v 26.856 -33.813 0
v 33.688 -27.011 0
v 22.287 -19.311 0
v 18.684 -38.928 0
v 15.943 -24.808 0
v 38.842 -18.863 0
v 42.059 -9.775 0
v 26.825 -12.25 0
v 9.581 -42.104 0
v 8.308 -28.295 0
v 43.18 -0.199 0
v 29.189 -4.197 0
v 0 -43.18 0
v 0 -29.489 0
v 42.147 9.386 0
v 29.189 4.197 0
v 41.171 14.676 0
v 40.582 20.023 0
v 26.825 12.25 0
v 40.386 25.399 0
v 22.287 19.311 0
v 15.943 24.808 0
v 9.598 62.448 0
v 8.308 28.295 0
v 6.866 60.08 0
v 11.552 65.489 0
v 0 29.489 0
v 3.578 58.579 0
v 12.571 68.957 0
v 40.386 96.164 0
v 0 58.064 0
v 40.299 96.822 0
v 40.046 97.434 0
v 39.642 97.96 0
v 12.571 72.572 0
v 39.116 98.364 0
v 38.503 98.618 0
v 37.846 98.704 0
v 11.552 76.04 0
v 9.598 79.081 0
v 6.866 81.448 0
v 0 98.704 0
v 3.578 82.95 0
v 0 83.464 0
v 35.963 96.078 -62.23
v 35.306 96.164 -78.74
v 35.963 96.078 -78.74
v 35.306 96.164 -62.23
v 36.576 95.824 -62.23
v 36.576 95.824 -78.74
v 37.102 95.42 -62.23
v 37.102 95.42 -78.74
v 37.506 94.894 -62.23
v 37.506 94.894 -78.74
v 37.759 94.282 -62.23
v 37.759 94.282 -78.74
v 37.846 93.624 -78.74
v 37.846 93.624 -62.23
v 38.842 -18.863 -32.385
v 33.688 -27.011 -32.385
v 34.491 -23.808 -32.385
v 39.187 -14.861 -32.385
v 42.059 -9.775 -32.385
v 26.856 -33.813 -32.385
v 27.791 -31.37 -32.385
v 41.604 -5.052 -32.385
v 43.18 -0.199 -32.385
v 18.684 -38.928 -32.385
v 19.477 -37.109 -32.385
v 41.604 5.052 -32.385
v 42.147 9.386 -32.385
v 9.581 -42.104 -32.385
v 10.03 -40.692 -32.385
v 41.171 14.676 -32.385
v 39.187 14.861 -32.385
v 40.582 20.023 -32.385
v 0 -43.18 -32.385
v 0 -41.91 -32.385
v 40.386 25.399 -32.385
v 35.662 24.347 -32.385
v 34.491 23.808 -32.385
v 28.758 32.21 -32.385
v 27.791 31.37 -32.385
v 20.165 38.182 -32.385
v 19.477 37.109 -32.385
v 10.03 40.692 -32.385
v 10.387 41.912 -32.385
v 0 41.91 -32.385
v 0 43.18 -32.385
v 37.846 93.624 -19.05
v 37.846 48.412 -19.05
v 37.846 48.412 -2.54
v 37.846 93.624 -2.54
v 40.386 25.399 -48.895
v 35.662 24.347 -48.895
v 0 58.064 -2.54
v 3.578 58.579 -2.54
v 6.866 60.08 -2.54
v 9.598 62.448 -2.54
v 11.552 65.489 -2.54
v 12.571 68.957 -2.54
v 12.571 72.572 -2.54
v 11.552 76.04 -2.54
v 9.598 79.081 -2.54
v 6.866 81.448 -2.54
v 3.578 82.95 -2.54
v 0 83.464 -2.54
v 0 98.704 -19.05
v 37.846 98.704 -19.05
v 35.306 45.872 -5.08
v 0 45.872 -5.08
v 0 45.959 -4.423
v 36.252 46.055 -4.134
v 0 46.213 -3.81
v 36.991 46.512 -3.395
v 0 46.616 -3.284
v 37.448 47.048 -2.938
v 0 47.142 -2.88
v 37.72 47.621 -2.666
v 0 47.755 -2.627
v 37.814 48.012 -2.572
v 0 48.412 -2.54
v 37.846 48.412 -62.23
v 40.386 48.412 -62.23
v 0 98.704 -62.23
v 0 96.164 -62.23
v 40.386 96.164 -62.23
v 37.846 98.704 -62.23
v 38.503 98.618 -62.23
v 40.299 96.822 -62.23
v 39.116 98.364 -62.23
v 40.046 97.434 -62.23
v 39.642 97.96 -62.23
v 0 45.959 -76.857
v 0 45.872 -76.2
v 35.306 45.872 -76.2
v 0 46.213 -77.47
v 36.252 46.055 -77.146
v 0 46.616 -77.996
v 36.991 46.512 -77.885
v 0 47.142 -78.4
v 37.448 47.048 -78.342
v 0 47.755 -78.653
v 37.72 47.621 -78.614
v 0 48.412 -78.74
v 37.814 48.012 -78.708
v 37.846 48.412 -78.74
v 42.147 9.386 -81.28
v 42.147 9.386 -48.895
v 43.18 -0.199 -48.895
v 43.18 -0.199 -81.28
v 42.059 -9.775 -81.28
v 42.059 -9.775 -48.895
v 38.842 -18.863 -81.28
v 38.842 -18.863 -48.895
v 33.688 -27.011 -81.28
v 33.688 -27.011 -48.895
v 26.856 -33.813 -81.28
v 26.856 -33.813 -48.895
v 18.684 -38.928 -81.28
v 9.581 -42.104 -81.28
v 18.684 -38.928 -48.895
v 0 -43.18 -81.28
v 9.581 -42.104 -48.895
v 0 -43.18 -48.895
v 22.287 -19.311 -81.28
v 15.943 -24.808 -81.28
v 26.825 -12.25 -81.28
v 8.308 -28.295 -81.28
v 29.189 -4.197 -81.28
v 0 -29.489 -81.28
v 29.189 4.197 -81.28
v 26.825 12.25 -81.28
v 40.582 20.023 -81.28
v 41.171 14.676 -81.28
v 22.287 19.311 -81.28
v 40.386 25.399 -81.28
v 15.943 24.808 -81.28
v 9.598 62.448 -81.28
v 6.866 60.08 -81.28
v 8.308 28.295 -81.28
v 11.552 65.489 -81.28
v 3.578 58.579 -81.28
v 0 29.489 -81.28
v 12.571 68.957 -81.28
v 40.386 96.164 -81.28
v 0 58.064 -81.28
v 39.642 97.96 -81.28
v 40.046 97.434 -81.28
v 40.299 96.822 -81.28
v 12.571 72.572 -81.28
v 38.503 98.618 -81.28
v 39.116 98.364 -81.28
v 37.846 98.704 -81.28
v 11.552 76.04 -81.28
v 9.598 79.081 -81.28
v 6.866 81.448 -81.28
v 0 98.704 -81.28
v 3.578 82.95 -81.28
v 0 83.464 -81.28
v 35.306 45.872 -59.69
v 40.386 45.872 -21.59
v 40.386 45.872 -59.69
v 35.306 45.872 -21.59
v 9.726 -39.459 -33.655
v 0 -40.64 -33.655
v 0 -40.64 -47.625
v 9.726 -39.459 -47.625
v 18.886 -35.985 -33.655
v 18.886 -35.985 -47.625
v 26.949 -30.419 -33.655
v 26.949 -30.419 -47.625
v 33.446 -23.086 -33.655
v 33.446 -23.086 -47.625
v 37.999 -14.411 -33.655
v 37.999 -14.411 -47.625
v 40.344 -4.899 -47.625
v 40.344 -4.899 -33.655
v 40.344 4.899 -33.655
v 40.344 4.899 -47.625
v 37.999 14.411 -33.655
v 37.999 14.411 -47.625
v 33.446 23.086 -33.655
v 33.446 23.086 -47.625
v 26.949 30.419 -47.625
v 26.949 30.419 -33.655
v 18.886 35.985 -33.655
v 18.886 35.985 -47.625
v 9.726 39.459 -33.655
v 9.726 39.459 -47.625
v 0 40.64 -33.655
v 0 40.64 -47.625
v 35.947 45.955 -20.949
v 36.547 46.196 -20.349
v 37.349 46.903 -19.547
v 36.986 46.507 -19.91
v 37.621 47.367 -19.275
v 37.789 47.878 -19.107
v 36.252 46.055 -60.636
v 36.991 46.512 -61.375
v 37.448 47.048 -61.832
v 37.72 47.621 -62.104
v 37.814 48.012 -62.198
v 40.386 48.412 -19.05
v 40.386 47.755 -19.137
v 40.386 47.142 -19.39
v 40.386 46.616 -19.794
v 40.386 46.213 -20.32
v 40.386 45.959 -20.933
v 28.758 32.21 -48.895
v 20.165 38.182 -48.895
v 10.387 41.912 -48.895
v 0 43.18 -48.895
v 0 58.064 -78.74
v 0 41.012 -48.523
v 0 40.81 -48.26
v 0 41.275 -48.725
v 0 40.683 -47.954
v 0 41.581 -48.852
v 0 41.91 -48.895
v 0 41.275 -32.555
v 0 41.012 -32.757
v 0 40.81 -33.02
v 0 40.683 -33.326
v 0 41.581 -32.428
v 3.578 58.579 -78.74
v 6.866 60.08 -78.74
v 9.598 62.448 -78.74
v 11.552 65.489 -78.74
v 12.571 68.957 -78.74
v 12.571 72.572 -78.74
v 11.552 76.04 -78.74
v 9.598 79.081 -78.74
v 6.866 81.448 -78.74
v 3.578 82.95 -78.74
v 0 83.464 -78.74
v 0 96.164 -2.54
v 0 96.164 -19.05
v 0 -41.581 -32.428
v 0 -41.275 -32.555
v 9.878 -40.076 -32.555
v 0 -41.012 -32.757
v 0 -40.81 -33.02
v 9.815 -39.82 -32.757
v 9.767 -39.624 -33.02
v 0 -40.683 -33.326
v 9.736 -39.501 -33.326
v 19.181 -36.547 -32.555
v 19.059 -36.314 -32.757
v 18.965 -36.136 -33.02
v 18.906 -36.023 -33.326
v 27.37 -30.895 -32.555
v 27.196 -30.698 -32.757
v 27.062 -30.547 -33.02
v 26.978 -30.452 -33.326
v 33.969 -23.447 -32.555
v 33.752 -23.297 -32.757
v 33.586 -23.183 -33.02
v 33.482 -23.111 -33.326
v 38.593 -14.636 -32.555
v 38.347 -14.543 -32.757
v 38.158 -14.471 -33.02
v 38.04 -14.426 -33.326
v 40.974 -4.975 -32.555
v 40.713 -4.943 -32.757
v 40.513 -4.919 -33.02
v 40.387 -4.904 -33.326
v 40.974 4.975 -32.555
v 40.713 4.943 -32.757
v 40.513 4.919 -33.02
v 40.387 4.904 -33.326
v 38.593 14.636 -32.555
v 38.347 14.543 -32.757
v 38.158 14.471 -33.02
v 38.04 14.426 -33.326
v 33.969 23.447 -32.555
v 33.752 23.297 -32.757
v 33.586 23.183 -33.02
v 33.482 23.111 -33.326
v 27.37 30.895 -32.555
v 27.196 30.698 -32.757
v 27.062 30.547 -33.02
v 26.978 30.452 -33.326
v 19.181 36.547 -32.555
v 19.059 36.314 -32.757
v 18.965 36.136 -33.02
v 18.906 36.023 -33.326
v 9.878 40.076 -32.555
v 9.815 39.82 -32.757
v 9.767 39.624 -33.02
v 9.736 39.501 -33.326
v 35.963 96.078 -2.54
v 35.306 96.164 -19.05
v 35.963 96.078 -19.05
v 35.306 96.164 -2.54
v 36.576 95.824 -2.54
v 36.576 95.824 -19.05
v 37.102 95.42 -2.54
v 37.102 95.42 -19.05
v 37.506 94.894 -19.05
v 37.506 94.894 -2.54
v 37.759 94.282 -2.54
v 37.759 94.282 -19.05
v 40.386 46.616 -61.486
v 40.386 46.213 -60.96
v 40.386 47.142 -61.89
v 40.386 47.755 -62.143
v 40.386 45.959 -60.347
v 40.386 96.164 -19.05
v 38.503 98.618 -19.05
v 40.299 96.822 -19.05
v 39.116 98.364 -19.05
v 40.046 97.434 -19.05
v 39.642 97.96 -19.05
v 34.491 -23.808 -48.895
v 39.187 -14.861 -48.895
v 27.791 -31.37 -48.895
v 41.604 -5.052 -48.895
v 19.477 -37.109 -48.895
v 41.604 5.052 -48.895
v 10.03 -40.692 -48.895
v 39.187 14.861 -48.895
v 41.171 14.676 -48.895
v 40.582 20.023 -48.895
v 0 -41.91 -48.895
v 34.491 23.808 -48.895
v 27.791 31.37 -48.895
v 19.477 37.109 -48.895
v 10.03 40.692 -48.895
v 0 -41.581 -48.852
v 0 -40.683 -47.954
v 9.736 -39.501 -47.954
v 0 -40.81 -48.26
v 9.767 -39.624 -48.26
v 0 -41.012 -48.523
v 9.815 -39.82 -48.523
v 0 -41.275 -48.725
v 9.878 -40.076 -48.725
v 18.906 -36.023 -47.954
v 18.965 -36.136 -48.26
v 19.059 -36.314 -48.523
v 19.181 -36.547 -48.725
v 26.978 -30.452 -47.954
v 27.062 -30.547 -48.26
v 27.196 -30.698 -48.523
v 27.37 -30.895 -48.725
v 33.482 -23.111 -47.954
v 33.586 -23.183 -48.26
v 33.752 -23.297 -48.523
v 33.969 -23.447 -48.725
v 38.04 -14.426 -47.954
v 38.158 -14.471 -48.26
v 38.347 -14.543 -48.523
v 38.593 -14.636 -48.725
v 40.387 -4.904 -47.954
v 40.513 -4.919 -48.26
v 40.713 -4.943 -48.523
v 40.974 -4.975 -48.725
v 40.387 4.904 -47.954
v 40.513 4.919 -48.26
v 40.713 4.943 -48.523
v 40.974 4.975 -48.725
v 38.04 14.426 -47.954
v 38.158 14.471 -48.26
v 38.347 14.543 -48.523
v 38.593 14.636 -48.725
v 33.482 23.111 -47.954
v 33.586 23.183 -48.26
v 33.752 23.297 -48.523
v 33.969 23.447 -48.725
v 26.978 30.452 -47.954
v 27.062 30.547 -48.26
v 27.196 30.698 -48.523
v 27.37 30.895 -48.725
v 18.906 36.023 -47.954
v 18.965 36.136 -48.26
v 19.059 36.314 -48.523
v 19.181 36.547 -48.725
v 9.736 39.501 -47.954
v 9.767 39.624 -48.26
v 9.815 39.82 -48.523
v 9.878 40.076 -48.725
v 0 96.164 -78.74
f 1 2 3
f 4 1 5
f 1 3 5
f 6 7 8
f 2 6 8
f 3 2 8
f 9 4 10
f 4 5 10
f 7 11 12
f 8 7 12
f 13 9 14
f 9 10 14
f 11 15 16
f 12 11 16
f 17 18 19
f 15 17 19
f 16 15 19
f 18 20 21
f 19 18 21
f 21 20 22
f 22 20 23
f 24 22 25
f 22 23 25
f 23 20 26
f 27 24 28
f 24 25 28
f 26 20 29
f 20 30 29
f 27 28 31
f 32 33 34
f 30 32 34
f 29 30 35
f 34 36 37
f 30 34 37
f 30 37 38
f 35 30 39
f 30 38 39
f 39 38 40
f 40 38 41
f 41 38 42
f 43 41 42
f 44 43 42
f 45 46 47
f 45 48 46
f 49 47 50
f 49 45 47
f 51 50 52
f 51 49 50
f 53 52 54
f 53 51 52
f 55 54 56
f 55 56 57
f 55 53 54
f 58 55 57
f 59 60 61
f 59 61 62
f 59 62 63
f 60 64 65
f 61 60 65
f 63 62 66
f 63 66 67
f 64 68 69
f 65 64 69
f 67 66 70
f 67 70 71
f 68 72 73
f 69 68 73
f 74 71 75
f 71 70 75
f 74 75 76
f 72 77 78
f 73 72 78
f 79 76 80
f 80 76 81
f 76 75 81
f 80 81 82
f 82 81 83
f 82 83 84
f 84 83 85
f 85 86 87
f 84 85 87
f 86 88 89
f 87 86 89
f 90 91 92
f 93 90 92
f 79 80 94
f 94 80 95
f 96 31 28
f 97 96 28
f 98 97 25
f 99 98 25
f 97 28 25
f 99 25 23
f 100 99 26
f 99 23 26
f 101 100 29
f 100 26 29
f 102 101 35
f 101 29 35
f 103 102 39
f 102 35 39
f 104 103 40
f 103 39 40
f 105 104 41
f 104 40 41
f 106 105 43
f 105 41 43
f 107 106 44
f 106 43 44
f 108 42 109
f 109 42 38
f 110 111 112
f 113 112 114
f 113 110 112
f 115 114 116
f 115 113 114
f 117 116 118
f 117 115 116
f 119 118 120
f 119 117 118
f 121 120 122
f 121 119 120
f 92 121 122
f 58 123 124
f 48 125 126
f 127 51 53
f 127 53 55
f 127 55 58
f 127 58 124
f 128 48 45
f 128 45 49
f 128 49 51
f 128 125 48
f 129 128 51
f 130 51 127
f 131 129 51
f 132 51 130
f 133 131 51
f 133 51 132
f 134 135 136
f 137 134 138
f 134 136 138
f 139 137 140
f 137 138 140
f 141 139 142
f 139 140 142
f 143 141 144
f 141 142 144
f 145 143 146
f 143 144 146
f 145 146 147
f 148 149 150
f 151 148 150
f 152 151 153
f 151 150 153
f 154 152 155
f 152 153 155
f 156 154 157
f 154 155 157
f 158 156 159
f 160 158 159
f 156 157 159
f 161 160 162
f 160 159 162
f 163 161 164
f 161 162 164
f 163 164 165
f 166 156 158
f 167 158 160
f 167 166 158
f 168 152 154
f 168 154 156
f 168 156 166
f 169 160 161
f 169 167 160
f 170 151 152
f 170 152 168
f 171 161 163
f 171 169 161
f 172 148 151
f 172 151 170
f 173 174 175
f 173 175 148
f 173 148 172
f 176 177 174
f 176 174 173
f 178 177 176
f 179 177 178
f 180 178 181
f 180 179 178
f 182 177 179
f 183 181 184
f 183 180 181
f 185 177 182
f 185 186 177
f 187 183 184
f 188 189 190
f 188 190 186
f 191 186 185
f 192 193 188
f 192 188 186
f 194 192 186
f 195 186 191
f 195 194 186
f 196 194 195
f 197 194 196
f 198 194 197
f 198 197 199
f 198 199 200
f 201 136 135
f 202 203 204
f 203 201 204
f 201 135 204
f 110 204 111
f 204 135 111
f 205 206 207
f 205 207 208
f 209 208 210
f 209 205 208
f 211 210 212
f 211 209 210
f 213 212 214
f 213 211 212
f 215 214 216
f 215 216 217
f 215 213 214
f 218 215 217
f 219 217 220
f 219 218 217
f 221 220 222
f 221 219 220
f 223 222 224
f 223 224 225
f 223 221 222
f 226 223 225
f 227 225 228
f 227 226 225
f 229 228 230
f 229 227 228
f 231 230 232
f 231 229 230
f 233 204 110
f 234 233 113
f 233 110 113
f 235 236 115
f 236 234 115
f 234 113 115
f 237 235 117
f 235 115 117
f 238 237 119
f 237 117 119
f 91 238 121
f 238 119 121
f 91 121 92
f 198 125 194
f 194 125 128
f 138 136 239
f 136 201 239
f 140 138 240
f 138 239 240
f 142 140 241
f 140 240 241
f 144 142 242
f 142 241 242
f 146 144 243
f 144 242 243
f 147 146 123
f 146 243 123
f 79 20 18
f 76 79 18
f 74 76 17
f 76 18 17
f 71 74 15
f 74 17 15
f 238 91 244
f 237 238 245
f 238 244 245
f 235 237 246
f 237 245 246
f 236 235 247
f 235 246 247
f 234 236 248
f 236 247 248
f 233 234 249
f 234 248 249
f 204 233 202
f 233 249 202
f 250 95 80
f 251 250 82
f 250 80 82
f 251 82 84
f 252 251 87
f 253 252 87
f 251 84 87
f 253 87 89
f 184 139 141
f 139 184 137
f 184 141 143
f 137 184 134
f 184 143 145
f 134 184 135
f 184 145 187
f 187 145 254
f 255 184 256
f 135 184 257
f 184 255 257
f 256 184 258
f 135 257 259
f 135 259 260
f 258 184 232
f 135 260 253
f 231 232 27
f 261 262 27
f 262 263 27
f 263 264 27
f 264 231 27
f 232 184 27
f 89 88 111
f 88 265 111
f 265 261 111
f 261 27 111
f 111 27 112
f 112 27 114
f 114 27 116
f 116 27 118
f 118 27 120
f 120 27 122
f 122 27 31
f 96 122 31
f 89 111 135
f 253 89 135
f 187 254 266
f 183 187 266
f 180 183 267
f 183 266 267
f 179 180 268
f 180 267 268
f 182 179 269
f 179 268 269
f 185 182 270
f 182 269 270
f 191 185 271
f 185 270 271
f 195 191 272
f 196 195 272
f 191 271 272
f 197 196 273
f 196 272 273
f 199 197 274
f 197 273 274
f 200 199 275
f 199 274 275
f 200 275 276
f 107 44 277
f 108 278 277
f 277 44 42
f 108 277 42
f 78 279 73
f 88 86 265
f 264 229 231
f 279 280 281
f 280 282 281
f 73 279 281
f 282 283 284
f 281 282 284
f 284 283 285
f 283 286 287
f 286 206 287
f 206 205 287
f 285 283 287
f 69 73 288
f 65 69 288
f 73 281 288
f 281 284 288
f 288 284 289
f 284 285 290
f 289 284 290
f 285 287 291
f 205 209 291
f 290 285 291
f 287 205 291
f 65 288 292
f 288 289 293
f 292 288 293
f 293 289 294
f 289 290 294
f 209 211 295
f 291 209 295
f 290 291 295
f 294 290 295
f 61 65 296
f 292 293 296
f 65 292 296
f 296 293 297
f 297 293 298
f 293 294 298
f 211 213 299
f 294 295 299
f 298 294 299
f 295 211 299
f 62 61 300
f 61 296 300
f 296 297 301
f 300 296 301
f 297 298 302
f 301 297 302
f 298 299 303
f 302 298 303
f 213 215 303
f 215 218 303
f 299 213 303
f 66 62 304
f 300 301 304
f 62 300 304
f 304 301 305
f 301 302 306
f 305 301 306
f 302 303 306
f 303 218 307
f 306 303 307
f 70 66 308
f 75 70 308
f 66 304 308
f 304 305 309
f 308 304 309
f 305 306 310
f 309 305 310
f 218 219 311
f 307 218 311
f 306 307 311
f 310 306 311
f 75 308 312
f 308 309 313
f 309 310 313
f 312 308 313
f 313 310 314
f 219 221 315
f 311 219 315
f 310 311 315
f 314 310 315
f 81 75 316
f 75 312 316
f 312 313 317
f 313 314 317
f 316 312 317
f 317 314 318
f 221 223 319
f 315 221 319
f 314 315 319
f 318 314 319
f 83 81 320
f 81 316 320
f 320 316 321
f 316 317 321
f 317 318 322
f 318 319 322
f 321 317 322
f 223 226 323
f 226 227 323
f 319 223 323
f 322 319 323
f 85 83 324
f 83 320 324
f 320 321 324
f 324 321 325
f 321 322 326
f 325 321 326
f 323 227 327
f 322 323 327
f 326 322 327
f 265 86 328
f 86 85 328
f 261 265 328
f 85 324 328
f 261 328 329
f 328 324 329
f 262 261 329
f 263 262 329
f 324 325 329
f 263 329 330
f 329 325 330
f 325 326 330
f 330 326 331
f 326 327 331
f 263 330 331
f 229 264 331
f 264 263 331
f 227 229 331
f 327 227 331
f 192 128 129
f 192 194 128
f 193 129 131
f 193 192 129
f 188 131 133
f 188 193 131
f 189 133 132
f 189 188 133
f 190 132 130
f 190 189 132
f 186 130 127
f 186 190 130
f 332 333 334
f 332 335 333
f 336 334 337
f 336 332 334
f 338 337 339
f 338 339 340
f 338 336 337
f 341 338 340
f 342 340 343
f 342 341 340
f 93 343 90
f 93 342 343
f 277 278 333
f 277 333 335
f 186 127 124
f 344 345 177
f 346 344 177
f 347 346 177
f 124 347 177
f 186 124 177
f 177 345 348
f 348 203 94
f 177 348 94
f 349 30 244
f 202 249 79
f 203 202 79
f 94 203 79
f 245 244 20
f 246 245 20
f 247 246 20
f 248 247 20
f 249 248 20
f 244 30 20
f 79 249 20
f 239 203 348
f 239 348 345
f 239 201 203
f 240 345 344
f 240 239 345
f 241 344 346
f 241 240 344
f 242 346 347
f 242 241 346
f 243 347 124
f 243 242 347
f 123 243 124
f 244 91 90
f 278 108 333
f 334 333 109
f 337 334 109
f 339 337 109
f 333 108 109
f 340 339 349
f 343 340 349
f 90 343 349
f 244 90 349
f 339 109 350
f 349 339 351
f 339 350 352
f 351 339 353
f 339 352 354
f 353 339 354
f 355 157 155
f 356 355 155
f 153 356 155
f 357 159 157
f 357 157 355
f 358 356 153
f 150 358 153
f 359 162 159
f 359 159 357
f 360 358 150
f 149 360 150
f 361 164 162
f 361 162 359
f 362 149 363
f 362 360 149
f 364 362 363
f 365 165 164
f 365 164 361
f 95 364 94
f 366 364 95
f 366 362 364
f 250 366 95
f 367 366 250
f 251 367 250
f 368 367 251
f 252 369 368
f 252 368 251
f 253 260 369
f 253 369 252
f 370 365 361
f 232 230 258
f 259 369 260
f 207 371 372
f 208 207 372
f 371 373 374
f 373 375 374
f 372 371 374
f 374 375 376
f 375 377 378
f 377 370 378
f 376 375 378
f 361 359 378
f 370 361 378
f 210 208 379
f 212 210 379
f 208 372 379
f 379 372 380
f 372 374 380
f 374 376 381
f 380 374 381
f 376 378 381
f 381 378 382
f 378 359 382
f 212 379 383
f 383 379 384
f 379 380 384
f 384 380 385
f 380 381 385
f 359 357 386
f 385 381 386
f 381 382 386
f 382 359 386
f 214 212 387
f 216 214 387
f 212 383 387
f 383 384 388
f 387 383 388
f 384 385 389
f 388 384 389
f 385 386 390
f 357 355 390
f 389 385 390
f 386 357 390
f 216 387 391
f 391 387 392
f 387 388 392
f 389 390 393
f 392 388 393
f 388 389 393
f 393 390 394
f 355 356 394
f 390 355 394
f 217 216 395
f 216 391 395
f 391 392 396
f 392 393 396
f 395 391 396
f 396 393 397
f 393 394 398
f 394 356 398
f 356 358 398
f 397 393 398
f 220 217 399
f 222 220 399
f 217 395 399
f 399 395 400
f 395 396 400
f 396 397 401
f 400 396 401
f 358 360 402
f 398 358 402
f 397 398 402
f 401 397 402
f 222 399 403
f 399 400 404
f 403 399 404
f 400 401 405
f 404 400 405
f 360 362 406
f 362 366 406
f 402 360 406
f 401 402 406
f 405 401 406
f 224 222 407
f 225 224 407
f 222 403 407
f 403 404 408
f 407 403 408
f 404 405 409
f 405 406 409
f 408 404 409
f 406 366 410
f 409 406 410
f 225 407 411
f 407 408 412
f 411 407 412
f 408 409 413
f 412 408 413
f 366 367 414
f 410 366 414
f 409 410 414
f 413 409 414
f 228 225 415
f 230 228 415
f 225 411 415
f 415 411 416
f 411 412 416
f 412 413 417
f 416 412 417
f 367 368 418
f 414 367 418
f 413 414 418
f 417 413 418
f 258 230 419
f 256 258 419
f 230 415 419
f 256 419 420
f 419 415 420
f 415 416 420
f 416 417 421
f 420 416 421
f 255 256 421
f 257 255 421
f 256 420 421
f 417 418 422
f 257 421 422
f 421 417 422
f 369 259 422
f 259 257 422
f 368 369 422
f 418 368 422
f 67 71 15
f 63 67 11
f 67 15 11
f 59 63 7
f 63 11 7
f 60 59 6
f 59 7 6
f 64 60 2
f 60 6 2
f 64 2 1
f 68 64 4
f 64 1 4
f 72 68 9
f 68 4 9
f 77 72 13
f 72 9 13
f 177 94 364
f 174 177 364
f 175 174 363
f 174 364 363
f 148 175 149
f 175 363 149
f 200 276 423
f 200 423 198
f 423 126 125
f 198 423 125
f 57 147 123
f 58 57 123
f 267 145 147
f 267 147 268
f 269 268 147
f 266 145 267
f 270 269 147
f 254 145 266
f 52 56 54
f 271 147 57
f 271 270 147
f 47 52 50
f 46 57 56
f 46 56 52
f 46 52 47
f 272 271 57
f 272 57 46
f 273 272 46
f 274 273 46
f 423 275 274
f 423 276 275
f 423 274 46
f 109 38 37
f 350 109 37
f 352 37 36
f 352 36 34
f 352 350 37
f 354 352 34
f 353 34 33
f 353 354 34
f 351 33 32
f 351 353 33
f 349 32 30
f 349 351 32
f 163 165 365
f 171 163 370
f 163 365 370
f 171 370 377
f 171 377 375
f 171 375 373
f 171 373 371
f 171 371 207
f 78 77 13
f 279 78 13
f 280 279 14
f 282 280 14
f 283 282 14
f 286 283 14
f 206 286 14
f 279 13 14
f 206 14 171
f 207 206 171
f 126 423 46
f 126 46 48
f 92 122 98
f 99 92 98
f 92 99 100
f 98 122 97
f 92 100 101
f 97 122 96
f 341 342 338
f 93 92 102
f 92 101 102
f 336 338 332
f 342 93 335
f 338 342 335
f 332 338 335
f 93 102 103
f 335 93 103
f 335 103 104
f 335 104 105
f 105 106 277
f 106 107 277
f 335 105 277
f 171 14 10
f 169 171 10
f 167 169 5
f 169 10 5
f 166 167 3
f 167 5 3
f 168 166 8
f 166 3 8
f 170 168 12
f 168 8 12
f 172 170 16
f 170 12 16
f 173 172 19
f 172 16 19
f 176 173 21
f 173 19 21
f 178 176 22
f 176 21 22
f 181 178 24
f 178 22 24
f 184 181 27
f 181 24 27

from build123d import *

# Parameters (mm, degrees)
BOSS_EXTRUDE1_DEPTH            = 81.28
SKETCH3_W                      = 76.2
SKETCH3_H                      = 50.292
CUT_EXTRUDE1_DEPTH             = 37.846
SKETCH4_W                      = 40.386
SKETCH4_H                      = 43.18
CUT_EXTRUDE2_DEPTH             = 52.832
FILLET1_R                      = 2.54
FILLET2_R                      = 2.54
FILLET3_R                      = 2.54
FILLET4_R                      = 2.54
SKETCH7_W                      = 16.51
SKETCH7_H                      = 2.54
CUT_EXTRUDE4_REACH             = 54.566
SKETCH8_W                      = 16.51
SKETCH8_H                      = 16.012242806
CUT_EXTRUDE4_DIRECTION_2_DEPTH = 2.54
FILLET5_R                      = 1.27


with BuildPart() as part:
    # Sketch1 → Boss-Extrude1 (new body)
    with BuildSketch(Plane.XY):
        with BuildLine():
            Line((0, 52.9844), (0, 58.0644))
            ThreePointArc((0, 58.0644), (12.7, 70.7644), (0, 83.4644))
            Line((0, 83.4644), (0, 98.7044))
            Line((0, 98.7044), (40.386, 98.7044))
            Line((40.386, 98.7044), (40.386, 25.398729968))
            ThreePointArc((40.386, 25.398729968), (40.827682914, 17.344312358), (42.147434783, 9.386487162))
            ThreePointArc((42.147434783, 9.386487162), (33.688432107, -27.011144777), (0, -43.18))
            Line((0, -43.18), (0, -29.4894))
            ThreePointArc((0, -29.4894), (29.4894, 0), (0, 29.4894))
            Line((0, 29.4894), (0, 52.9844))
        make_face()
    extrude(amount=-BOSS_EXTRUDE1_DEPTH)

    # Sketch3 → Cut-Extrude1 (cut)
    with BuildSketch(Plane.ZY):
        with Locations((-40.64, 71.0184)):
            Rectangle(SKETCH3_W, SKETCH3_H)
    extrude(amount=-CUT_EXTRUDE1_DEPTH, mode=Mode.SUBTRACT)

    # Sketch4 → Cut-Extrude2 (cut)
    with BuildSketch(Plane(origin=(0, 98.7044, 0), x_dir=(1, 0, 0), z_dir=(0, 1, 0))):
        with Locations((20.193, 40.64)):
            Rectangle(SKETCH4_W, SKETCH4_H)
    extrude(amount=-CUT_EXTRUDE2_DEPTH, mode=Mode.SUBTRACT)

    # Fillet1
    fillet1_edges = [part.edges().sort_by_distance(p)[0] for p in [
        (18.923, 45.8724, -78.74),
        (18.923, 45.8724, -2.54),
        (37.846, 45.8724, -10.795),
        (37.846, 45.8724, -70.485),
    ]]
    fillet(fillet1_edges, radius=FILLET1_R)

    # Fillet2
    fillet2_edges = [part.edges().sort_by_distance(p)[0] for p in [
        (37.846, 96.1644, -70.485),
        (37.846, 96.1644, -10.795),
    ]]
    fillet(fillet2_edges, radius=FILLET2_R)

    # Fillet3
    fillet3_edges = [part.edges().sort_by_distance(p)[0] for p in [
        (36.576, 45.8724, -19.05),
        (36.576, 45.8724, -62.23),
    ]]
    fillet(fillet3_edges, radius=FILLET3_R)

    # Fillet4
    fillet4_edges = [part.edges().sort_by_distance(p)[0] for p in [
        (40.386, 98.7044, -71.755),
        (40.386, 98.7044, -9.525),
    ]]
    fillet(fillet4_edges, radius=FILLET4_R)

    # Sketch7 → Cut-Revolve2 (revolve, cut)
    with BuildSketch(Plane.ZY):
        with Locations((-40.64, -41.91)):
            Rectangle(SKETCH7_W, SKETCH7_H)
    revolve(axis=Axis((0, 0, -81.28), (0, 0, 1)), mode=Mode.SUBTRACT)

    # Sketch8 → Cut-Extrude4 (cut, up to next)
    with BuildSketch(Plane(origin=(42.147434783, 9.386487162, 0), x_dir=(0, 0, -1), z_dir=(0.976086957, 0.217380435, 0)), mode=Mode.PRIVATE) as cut_extrude4_sk1:
        with Locations((40.64, 8.006121403)):
            Rectangle(SKETCH8_W, SKETCH8_H)
    cut_extrude4_tool1 = extrude(cut_extrude4_sk1.sketch, amount=-CUT_EXTRUDE4_REACH, mode=Mode.PRIVATE) & part.part
    add(cut_extrude4_tool1.solids().sort_by_distance((40.407061, 17.201158, -40.64))[0], mode=Mode.SUBTRACT)

    # Sketch8 → Cut-Extrude4 direction 2 (cut)
    with BuildSketch(Plane(origin=(42.147434783, 9.386487162, 0), x_dir=(0, 0, -1), z_dir=(0.976086957, 0.217380435, 0))):
        with Locations((40.64, 8.006121403)):
            Rectangle(SKETCH8_W, SKETCH8_H)
    extrude(amount=CUT_EXTRUDE4_DIRECTION_2_DEPTH, mode=Mode.SUBTRACT)

    # Fillet5
    fillet5_edges = [part.edges().sort_by_distance(p)[0] for p in [
        (40.64, 0, -48.895),
        (40.64, 0, -32.385),
    ]]
    fillet(fillet5_edges, radius=FILLET5_R)


solid = part.part
